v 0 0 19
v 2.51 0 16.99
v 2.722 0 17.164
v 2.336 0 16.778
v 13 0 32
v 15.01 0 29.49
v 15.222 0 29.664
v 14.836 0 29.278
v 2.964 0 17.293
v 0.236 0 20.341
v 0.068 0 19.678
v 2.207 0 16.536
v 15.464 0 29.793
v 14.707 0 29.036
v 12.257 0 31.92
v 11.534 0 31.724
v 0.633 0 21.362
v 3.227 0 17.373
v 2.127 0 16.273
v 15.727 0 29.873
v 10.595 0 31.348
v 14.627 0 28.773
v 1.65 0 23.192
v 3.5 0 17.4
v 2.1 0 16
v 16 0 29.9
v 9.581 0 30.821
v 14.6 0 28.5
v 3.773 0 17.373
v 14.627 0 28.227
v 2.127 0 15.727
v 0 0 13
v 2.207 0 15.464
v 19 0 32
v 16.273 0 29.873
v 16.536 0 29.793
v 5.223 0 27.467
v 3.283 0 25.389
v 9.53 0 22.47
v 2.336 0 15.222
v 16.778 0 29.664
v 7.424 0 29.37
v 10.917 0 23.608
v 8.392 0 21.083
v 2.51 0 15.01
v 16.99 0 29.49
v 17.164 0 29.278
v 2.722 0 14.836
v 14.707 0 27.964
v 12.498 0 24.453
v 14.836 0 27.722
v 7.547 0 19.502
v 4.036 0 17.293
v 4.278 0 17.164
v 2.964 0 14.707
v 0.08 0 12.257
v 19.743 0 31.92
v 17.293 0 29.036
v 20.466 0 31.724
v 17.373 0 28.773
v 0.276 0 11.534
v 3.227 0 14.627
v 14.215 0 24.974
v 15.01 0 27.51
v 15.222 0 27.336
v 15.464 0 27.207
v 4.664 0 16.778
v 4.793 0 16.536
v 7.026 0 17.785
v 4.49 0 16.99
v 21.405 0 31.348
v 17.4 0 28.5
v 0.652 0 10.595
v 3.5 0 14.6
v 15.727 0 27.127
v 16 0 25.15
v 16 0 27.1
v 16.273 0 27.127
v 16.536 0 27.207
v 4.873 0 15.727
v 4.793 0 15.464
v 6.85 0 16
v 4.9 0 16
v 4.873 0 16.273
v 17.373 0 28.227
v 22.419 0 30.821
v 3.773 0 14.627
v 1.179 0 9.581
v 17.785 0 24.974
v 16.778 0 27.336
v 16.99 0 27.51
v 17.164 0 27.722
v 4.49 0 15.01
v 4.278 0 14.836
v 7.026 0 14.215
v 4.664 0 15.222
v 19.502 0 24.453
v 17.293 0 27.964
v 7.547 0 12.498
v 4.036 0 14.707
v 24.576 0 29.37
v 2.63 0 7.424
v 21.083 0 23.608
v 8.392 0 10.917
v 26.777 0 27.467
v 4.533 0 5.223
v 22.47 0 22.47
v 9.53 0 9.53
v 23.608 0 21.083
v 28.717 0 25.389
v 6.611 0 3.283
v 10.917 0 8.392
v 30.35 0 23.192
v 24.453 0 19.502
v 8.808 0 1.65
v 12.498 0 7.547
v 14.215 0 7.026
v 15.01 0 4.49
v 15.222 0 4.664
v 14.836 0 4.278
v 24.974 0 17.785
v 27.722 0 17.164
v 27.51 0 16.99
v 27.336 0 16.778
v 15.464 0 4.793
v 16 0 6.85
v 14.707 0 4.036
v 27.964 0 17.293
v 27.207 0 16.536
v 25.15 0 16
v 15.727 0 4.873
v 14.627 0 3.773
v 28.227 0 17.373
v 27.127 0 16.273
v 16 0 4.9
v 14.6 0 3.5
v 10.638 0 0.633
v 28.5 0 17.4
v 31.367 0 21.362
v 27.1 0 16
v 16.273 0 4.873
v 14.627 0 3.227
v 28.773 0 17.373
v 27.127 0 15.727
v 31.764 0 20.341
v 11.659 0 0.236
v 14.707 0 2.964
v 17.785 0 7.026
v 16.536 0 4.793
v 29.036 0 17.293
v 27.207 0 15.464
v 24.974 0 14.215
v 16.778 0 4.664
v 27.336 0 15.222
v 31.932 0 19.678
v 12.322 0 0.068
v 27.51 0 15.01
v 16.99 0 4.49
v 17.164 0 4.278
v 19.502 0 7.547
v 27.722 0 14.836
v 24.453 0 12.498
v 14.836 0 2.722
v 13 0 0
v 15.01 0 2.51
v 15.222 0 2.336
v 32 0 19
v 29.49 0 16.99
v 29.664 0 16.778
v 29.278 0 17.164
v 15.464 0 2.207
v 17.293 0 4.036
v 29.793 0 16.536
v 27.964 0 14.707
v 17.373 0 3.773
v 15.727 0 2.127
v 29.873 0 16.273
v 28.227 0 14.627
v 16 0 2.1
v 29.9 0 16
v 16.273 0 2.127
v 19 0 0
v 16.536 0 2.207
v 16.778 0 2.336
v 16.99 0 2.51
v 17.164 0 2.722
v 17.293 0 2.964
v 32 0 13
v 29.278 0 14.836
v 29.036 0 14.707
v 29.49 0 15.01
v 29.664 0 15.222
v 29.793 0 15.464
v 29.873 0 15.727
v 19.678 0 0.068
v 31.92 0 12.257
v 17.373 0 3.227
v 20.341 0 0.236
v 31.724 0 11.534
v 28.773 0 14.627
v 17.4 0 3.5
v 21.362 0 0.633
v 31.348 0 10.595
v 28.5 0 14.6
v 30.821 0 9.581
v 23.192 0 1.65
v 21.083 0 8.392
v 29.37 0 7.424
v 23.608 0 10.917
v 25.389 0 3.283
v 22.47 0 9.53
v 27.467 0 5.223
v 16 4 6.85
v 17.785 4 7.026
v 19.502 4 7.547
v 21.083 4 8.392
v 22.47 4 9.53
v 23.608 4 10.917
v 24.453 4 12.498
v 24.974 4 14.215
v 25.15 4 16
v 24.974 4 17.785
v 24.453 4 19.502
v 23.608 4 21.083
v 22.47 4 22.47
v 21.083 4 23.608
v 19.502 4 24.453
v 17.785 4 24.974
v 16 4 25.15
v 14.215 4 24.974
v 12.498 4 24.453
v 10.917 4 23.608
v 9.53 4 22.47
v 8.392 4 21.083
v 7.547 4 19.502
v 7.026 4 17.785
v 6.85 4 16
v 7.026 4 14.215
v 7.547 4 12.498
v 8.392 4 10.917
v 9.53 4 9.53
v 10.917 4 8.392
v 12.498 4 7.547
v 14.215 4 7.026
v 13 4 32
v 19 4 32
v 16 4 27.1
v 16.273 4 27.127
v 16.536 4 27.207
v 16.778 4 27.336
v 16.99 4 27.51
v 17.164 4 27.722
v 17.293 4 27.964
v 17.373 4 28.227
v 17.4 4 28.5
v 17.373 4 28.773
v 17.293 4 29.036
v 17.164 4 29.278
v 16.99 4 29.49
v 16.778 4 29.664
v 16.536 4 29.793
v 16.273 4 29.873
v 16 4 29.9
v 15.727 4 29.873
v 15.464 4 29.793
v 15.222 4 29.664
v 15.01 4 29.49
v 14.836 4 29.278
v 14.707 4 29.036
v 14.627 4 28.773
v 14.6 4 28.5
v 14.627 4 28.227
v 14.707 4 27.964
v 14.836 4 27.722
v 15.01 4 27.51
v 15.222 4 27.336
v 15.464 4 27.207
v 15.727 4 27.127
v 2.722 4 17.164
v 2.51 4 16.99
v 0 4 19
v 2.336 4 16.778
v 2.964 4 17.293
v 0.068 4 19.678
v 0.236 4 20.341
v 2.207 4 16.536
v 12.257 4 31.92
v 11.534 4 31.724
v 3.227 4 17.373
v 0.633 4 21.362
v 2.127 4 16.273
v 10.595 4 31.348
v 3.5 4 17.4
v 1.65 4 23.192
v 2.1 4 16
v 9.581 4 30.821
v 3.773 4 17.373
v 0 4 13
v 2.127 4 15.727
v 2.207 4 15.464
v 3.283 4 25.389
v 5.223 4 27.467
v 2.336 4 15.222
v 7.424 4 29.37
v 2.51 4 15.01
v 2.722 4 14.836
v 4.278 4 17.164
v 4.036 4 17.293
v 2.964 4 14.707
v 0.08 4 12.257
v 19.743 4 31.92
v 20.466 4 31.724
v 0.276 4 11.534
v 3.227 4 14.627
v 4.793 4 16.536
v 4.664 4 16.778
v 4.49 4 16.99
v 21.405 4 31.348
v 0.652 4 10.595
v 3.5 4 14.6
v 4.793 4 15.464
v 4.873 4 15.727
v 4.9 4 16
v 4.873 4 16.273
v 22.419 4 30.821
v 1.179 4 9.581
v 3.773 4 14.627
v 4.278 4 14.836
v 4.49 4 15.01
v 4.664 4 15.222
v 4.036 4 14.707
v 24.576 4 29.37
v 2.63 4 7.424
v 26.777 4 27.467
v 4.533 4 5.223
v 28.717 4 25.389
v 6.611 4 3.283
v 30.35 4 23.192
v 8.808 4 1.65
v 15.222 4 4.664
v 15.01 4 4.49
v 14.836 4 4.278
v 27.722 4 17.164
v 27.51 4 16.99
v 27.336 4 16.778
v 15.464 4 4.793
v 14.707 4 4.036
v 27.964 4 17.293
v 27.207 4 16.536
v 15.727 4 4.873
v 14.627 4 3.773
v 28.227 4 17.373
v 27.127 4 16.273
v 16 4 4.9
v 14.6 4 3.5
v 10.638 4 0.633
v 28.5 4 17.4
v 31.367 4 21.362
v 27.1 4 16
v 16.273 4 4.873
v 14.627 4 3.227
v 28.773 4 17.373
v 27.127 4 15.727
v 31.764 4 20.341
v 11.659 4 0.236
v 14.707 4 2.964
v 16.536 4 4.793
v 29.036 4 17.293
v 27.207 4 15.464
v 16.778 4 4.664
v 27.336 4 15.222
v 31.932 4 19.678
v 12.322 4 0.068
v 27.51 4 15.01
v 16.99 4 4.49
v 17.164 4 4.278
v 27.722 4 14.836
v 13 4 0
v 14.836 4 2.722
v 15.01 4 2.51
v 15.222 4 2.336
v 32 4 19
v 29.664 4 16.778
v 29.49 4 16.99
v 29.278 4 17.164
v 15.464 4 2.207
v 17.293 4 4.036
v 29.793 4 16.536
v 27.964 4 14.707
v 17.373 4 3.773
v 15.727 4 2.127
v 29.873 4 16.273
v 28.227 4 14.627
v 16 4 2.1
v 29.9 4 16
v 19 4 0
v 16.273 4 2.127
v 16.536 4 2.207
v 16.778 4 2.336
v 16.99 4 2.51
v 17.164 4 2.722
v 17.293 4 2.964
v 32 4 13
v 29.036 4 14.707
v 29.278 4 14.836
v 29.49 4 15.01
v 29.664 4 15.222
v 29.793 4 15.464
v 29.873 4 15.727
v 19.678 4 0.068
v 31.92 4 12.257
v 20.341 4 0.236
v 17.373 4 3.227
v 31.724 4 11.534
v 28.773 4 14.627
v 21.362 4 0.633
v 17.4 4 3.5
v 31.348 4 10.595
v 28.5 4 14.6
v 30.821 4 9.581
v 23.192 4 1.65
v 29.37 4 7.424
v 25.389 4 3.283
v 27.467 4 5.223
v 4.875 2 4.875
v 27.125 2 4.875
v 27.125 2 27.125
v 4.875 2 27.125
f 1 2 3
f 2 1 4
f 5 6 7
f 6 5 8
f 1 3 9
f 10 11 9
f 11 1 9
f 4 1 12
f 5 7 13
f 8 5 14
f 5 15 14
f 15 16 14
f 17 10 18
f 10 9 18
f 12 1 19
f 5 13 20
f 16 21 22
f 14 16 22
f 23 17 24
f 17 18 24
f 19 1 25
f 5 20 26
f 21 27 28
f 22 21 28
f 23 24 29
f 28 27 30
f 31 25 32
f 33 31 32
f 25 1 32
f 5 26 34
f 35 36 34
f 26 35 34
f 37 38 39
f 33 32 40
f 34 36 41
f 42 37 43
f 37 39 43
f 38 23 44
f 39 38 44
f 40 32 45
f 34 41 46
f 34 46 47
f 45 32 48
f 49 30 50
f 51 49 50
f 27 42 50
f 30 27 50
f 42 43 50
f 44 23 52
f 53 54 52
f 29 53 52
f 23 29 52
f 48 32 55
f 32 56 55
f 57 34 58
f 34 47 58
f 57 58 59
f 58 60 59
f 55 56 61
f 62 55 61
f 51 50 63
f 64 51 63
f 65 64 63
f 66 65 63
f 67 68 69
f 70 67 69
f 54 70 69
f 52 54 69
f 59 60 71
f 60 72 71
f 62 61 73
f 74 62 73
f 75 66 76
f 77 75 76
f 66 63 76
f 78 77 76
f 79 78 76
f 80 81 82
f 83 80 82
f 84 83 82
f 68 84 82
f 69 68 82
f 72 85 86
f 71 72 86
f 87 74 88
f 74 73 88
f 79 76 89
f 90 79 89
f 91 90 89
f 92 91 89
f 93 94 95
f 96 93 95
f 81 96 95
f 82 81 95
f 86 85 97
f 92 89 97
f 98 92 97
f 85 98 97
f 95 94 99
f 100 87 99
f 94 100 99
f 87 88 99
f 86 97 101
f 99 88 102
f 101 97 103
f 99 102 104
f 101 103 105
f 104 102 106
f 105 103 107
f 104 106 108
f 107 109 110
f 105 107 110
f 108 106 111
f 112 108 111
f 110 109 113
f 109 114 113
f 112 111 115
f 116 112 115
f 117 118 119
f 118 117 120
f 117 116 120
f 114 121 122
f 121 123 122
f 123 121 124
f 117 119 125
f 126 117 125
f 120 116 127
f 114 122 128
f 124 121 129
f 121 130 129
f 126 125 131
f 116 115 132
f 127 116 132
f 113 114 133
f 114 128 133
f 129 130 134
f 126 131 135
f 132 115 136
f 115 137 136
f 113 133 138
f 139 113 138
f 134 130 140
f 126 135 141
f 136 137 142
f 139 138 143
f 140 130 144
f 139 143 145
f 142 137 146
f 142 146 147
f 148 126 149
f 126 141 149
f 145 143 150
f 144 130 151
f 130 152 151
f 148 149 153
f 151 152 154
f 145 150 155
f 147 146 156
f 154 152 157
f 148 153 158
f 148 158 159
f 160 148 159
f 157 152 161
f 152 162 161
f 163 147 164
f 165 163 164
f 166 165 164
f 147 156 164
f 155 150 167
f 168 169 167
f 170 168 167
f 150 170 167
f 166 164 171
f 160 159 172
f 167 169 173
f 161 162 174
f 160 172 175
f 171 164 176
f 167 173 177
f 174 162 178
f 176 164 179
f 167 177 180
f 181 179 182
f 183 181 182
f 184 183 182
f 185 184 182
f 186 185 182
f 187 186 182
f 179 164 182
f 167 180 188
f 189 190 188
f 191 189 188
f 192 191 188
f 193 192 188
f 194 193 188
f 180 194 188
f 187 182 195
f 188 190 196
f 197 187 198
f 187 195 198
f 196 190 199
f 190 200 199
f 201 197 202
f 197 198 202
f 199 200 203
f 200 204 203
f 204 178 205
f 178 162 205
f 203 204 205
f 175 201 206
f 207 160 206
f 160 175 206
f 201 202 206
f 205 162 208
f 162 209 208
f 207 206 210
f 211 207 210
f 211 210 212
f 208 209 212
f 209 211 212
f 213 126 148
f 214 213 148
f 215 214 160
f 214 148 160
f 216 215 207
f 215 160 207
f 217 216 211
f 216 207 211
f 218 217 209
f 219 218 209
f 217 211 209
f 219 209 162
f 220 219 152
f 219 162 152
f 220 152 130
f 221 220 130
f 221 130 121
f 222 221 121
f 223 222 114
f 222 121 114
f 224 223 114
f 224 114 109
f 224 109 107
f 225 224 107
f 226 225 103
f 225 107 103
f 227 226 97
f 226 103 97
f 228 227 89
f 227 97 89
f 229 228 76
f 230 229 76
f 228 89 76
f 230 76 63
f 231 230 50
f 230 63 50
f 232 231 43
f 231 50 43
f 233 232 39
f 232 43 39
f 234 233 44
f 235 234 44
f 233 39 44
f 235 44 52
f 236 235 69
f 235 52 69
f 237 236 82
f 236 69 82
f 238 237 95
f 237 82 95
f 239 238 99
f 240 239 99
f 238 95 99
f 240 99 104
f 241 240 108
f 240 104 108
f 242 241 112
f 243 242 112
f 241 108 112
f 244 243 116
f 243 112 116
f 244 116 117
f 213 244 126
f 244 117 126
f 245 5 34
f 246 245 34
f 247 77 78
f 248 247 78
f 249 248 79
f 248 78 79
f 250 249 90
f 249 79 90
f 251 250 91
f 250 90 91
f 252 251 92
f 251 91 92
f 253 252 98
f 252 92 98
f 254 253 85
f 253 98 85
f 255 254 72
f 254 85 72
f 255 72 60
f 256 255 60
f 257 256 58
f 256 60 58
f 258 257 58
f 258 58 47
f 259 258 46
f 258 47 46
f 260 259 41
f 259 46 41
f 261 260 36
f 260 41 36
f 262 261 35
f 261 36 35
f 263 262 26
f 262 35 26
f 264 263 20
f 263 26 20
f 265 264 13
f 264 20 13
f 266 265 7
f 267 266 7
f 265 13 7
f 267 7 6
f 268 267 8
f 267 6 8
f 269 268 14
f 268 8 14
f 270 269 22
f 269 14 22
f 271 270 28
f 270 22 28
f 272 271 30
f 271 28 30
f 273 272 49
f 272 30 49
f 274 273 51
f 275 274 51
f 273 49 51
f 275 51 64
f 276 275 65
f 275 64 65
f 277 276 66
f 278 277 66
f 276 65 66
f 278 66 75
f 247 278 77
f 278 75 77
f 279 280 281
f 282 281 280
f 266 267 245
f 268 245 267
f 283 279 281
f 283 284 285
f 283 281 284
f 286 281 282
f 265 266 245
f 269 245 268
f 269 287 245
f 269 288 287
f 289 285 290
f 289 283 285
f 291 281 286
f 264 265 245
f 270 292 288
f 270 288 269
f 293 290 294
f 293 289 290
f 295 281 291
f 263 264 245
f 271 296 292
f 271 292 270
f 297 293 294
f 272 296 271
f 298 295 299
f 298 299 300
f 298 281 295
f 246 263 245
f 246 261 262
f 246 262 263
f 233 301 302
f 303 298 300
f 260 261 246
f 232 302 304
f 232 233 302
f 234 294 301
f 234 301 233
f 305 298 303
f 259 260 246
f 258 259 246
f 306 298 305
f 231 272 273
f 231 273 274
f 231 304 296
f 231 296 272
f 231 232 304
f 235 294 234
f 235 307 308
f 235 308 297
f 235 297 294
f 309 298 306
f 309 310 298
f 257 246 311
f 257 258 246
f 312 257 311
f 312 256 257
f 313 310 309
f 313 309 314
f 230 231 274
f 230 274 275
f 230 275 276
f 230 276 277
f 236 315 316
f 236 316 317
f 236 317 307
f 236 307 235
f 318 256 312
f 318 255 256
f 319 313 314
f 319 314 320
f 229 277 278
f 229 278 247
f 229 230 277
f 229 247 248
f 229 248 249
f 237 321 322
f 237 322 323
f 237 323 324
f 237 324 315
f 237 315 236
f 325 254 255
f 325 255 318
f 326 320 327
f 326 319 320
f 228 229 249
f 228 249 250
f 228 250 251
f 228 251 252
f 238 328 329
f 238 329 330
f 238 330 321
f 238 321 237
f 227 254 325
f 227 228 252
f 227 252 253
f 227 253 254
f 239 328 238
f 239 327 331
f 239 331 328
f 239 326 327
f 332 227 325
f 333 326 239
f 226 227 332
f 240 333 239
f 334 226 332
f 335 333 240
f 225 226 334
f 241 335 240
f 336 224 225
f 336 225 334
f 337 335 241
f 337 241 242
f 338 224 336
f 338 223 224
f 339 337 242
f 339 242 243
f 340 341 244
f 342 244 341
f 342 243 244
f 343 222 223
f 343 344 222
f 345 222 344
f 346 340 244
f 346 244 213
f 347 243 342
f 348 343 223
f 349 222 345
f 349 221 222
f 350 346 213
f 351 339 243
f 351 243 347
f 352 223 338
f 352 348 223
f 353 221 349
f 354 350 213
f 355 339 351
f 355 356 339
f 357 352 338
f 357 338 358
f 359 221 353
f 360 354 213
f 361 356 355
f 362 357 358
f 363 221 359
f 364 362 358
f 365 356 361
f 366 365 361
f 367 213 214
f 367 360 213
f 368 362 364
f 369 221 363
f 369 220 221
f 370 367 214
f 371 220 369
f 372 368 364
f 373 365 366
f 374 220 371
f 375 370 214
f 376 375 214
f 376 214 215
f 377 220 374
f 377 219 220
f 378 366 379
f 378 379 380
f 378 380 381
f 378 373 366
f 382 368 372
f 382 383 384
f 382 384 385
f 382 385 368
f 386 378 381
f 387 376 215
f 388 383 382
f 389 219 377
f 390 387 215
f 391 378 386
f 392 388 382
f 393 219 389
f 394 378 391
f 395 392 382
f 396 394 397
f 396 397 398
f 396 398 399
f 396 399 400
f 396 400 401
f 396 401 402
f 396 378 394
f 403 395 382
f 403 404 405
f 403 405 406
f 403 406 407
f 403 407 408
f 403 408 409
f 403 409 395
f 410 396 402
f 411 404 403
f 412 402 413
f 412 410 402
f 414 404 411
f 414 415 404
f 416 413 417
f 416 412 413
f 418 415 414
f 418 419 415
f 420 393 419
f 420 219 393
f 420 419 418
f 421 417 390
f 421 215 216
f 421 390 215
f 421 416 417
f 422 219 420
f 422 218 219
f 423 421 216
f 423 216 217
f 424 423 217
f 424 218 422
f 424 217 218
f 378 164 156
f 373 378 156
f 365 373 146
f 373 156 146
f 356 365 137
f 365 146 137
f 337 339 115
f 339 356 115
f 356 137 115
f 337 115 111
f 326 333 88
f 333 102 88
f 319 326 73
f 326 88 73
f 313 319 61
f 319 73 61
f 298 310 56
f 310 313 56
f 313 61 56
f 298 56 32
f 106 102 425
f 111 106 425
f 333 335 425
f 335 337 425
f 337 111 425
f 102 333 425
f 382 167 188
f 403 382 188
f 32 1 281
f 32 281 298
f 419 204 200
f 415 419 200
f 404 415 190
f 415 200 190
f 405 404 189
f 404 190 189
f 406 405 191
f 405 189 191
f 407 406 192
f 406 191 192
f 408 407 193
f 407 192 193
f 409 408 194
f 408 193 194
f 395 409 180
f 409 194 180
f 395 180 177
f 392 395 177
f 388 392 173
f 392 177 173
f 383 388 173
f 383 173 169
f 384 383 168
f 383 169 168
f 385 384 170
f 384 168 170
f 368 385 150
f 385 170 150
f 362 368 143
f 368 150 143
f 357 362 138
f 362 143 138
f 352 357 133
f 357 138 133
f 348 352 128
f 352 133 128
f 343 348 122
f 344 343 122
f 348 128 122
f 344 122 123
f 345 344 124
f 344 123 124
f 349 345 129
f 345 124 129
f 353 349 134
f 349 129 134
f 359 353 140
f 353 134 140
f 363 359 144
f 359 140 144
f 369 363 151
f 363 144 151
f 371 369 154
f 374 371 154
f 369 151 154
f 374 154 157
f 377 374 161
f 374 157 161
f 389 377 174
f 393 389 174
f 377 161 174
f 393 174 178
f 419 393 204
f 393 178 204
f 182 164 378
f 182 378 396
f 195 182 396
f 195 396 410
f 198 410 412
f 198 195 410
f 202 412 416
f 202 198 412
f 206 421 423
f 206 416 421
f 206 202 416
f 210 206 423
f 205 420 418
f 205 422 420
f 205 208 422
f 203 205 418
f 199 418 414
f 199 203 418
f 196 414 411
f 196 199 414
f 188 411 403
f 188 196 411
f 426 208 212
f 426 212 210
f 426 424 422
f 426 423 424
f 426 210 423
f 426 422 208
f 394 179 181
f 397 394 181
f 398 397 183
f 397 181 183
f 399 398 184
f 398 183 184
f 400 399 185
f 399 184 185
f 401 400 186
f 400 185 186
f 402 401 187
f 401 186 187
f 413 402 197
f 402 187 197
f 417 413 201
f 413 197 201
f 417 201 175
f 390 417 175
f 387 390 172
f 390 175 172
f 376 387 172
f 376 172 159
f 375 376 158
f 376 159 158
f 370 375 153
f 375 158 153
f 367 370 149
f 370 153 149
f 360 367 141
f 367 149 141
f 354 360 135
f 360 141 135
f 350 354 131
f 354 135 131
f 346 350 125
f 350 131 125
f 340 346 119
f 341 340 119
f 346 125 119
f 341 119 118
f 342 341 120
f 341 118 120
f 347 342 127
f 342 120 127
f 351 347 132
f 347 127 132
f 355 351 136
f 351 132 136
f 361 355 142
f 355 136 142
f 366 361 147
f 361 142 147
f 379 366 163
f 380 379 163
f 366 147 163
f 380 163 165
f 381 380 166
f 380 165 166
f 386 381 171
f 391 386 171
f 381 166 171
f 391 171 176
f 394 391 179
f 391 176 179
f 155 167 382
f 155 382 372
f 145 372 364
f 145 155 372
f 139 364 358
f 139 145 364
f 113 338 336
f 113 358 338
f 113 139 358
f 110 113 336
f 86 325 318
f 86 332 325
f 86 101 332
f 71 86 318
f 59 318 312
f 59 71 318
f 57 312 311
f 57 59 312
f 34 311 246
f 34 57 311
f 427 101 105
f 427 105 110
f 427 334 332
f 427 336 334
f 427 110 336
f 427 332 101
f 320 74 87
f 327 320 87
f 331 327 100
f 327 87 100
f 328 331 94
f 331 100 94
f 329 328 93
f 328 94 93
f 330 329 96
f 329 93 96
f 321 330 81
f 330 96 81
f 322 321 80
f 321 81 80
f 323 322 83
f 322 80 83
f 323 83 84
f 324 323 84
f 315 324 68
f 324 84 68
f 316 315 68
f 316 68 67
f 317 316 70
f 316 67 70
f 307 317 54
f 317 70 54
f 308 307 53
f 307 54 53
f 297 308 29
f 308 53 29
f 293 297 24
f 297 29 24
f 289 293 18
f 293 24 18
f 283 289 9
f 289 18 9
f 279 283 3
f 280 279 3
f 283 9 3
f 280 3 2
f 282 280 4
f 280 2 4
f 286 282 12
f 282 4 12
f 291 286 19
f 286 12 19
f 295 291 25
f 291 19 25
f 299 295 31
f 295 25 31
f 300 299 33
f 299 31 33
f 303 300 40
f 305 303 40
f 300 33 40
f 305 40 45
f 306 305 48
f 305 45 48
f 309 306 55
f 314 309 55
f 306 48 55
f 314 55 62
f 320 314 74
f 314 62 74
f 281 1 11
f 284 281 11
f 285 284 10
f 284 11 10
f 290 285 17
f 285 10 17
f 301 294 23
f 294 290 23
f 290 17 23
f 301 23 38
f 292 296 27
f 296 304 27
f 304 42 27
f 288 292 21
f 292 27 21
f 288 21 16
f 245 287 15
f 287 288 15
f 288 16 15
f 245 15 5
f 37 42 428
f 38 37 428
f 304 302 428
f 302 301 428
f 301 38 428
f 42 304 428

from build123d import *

# Parameters (mm, degrees)
SKETCH1_W           = 32
SKETCH1_H           = 32
BOSS_EXTRUDE1_DEPTH = 4
SKETCH2_R           = 9.15
SKETCH2_R_2         = 1.4
CUT_EXTRUDE1_DEPTH  = 4
FILLET1_SIZE        = 13


with BuildPart() as part:
    # Sketch1 → Boss-Extrude1 (new body)
    with BuildSketch(Plane(origin=(0, 0, 0), x_dir=(1, 0, 0), z_dir=(0, 1, 0))):
        with Locations((16, -16)):
            Rectangle(SKETCH1_W, SKETCH1_H)
    extrude(amount=BOSS_EXTRUDE1_DEPTH)

    # Sketch2 → Cut-Extrude1 (cut)
    with BuildSketch(Plane(origin=(0, 0, 0), x_dir=(-1, 0, 0), z_dir=(0, -1, 0))):
        with Locations(Location((-16, -16, 0), (0, 0, 90))):
            Circle(SKETCH2_R)
        with Locations(Location((-16, -28.5, 0), (0, 0, 90))):
            Circle(SKETCH2_R_2)
        with Locations(Location((-28.5, -16, 0), (0, 0, 90))):
            Circle(SKETCH2_R_2)
        with Locations(Location((-16, -3.5, 0), (0, 0, 90))):
            Circle(SKETCH2_R_2)
        with Locations(Location((-3.5, -16, 0), (0, 0, 90))):
            Circle(SKETCH2_R_2)
    extrude(amount=-CUT_EXTRUDE1_DEPTH, mode=Mode.SUBTRACT)

    # Fillet1
    # a fillet whose section is not a circle: 13 mm, written as the material it takes off along each edge
    with BuildSketch(Plane(origin=(0, -32.5, 0), x_dir=(1, 0, 0), z_dir=(0, 1, 0)), Plane(origin=(0, -32.5, 32), x_dir=(0, 0, -1), z_dir=(0, 1, 0))) as fillet1_piece_1:
        with BuildLine():
            Bezier((FILLET1_SIZE, 0), (0, 0), (0, -FILLET1_SIZE), weights=[1, 0.333333333, 1])
            Line((0, -FILLET1_SIZE), (0, 0))
            Line((0, 0), (FILLET1_SIZE, 0))
        make_face()
    extrude(amount=69, mode=Mode.SUBTRACT)
    with BuildSketch(Plane(origin=(32, -32.5, 0), x_dir=(-1, 0, 0), z_dir=(0, 1, 0)), Plane(origin=(32, -32.5, 32), x_dir=(0, 0, -1), z_dir=(0, 1, 0))) as fillet1_piece_2:
        with BuildLine():
            Bezier((FILLET1_SIZE, 0), (0, 0), (0, FILLET1_SIZE), weights=[1, 0.333333333, 1])
            Line((0, FILLET1_SIZE), (0, 0))
            Line((0, 0), (FILLET1_SIZE, 0))
        make_face()
    extrude(amount=69, mode=Mode.SUBTRACT)


solid = part.part
